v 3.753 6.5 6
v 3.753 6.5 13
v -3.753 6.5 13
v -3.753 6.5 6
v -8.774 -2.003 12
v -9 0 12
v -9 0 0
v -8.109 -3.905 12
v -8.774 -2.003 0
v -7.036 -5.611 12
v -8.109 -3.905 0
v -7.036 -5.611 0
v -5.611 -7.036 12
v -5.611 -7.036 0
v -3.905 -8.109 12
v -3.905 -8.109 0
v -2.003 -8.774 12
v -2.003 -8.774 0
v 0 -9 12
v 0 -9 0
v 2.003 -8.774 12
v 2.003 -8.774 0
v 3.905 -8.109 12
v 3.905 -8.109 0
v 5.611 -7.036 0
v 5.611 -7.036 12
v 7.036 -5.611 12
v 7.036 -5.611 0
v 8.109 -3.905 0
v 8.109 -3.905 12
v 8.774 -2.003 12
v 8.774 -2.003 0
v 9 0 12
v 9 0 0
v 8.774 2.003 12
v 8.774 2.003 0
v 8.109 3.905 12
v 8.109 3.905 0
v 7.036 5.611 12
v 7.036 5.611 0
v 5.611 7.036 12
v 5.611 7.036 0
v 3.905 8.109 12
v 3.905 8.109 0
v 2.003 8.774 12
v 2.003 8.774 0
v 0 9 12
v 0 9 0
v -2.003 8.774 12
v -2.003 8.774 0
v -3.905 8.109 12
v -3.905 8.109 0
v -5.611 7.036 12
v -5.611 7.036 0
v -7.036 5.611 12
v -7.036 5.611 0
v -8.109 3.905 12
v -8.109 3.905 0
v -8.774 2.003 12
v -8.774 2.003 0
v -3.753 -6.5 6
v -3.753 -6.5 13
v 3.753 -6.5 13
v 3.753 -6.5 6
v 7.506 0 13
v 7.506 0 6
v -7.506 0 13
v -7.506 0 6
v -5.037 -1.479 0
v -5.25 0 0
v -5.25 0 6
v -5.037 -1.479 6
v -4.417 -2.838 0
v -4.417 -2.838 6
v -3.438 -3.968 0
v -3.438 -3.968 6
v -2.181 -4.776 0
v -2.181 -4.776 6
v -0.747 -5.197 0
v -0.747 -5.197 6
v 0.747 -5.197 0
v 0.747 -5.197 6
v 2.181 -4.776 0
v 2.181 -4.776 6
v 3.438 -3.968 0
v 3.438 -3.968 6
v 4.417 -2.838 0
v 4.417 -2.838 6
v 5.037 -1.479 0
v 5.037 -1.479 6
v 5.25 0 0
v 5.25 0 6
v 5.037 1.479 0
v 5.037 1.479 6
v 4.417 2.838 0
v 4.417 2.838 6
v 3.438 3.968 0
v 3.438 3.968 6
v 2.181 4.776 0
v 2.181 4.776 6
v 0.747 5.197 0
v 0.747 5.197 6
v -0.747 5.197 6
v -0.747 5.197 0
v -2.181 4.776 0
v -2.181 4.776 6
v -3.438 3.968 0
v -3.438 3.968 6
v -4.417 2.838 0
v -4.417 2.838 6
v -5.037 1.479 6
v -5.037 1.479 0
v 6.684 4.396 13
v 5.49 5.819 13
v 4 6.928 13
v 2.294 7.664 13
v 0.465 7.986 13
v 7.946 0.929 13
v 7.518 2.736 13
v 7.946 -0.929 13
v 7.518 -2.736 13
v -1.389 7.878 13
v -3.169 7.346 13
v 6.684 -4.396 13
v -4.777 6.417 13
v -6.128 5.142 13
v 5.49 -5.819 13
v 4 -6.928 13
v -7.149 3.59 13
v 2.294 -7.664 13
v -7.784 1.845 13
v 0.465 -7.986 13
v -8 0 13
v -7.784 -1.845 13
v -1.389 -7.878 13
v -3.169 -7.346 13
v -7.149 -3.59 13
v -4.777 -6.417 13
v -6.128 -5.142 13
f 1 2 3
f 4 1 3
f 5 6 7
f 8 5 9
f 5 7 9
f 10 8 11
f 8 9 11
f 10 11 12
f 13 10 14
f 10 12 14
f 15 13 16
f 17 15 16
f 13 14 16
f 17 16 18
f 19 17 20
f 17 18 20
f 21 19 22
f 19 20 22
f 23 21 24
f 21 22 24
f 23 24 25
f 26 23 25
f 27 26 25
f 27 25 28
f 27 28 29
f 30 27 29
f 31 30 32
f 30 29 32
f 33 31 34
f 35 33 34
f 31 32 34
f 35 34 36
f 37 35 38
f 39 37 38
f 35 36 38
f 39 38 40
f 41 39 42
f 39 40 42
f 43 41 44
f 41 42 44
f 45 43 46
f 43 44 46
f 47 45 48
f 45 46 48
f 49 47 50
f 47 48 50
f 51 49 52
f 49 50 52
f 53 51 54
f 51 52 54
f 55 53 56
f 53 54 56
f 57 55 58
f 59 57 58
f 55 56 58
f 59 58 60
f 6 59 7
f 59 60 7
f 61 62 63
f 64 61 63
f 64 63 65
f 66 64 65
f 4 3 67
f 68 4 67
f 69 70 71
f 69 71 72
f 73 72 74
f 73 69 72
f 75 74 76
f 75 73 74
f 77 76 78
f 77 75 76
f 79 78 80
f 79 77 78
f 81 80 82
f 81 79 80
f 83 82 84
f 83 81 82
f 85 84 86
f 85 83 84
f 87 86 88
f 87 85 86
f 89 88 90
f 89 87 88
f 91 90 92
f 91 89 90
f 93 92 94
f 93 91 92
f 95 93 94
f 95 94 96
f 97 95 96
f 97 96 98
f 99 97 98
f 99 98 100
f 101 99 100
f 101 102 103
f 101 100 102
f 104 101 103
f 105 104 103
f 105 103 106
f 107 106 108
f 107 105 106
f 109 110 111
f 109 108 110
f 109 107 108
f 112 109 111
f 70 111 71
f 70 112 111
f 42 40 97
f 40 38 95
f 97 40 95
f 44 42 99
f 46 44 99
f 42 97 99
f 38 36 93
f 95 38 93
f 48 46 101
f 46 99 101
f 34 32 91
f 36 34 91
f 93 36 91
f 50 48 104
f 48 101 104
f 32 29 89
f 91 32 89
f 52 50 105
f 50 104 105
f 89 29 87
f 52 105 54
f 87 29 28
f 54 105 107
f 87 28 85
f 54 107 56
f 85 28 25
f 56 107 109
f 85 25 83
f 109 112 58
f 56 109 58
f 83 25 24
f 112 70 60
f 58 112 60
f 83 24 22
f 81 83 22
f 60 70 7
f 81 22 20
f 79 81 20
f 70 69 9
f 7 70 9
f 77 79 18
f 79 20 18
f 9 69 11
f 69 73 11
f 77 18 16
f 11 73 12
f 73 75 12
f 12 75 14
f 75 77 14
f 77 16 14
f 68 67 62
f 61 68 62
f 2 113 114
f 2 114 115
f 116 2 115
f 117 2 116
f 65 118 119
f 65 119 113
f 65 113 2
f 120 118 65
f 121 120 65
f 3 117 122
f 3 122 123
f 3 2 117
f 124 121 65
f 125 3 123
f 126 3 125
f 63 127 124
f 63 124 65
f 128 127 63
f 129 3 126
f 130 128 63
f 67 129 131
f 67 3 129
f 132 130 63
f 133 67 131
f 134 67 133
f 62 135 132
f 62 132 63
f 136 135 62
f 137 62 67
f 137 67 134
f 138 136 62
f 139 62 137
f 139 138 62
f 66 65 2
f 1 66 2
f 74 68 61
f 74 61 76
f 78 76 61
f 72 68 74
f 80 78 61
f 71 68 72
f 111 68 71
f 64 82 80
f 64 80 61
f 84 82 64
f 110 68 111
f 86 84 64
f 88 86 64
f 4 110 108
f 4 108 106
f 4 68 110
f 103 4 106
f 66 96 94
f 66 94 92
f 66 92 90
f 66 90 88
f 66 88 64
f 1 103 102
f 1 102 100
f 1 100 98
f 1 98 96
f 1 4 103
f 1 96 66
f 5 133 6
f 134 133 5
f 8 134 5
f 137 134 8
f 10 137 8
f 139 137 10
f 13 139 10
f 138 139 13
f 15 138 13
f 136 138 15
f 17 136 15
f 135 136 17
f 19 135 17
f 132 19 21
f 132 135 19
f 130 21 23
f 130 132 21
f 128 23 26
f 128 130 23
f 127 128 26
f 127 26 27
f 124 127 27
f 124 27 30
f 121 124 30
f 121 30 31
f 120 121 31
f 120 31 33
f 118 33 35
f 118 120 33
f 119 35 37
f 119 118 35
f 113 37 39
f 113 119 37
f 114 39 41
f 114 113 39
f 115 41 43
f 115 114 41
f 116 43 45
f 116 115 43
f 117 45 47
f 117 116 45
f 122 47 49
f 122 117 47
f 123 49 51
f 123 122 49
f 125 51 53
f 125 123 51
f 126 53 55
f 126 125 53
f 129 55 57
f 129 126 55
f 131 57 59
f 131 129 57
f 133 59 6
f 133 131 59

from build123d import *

# Parameters (mm, degrees)
ESQUISSE1_R             = 9
ESQUISSE1_R_2           = 5.25
BOSS_EXTRU_1_DEPTH      = 13
ENL_V_MAT_EXTRU_1_DEPTH = 7
CHANFREIN1_SIZE         = 1


with BuildPart() as part:
    # Esquisse1 → Boss.-Extru.1 (new body)
    with BuildSketch(Plane.XY):
        with Locations(Location((0, 0, 0), (0, 0, 180))):
            Circle(ESQUISSE1_R)
        with Locations(Location((0, 0, 0), (0, 0, 180))):
            Circle(ESQUISSE1_R_2, mode=Mode.SUBTRACT)
    extrude(amount=BOSS_EXTRU_1_DEPTH)

    # Esquisse2 → Enlèv. mat.-Extru.1 (cut)
    with BuildSketch(Plane.XY.offset(13)):
        Polygon((3.75277675, 6.5), (-3.75277675, 6.5), (-7.505553499, 0), (-3.75277675, -6.5), (3.75277675, -6.5), (7.505553499, 0), align=None)
    extrude(amount=-ENL_V_MAT_EXTRU_1_DEPTH, mode=Mode.SUBTRACT)

    # Chanfrein1
    chanfrein1_edges = [part.edges().sort_by_distance(p)[0] for p in [
        (9, 0, 13),
    ]]
    chamfer(chanfrein1_edges, length=CHANFREIN1_SIZE)


solid = part.part
